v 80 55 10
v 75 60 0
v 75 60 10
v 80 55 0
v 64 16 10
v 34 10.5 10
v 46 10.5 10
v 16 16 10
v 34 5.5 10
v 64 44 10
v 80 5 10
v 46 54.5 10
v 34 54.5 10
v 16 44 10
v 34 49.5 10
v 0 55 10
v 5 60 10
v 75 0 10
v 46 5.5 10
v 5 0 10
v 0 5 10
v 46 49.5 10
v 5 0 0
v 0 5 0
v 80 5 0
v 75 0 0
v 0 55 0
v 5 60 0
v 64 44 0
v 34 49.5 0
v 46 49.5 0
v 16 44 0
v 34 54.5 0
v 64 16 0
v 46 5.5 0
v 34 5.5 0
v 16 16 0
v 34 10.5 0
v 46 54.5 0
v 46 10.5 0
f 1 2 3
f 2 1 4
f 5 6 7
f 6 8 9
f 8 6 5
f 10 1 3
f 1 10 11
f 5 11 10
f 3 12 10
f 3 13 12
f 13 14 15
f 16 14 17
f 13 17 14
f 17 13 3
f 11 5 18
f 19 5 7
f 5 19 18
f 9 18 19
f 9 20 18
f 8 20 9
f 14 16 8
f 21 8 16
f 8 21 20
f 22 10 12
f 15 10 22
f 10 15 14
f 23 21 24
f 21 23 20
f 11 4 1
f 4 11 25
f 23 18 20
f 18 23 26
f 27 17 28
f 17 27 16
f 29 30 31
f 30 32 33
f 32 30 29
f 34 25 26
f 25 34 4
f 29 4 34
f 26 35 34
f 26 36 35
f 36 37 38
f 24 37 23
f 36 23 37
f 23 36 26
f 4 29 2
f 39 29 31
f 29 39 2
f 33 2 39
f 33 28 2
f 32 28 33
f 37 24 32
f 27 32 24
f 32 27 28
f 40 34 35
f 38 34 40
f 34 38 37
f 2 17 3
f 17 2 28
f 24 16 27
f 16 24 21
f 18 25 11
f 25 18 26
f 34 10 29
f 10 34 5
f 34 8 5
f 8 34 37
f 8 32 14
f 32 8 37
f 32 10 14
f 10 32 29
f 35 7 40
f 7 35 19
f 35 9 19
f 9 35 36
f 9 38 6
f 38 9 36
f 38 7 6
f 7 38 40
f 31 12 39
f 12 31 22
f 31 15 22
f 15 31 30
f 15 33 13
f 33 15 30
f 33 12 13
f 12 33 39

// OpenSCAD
$fn = 32;

// ----------------------------------------------------------------------
// Frame plate: 80 x 60 frame, 16 mm rails
// ----------------------------------------------------------------------

// --- parameters (mm) ---
plate_l = 80;             // plate length, X
plate_w = 60;             // plate width, Y
plate_t = 10;             // plate thickness, Z (extrusion height)
corner_c = 5;             // corner chamfer
frame_bar = 16;           // frame rail width
slot_l = 12;              // adjustment slot length
slot_w = 5;               // adjustment slot width
fit_tol = 0.1;            // declared fit tolerance (prompt contract)
free_tol = 0.5;           // declared free tolerance (prompt contract)

win_l = plate_l - 2 * frame_bar;  // window length
win_w = plate_w - 2 * frame_bar;  // window width

profile = [[5, 0], [75, 0], [80, 5], [80, 55], [75, 60], [5, 60], [0, 55], [0, 5]];  // primary outline, 8 points, counter clockwise
void_1 = [[16, 16], [64, 16], [64, 44], [16, 44]];  // the window, 4 points
void_2 = [[34, 5.5], [46, 5.5], [46, 10.5], [34, 10.5]];  // adjustment slot, 4 points
void_3 = [[34, 49.5], [46, 49.5], [46, 54.5], [34, 54.5]];  // adjustment slot, 4 points

// --- the one profile operation ---
difference() {
  linear_extrude(height = plate_t) polygon(points = profile);
  translate([0, 0, -1])
    linear_extrude(height = plate_t + 2) polygon(points = void_1);
  translate([0, 0, -1])
    linear_extrude(height = plate_t + 2) polygon(points = void_2);
  translate([0, 0, -1])
    linear_extrude(height = plate_t + 2) polygon(points = void_3);
}
